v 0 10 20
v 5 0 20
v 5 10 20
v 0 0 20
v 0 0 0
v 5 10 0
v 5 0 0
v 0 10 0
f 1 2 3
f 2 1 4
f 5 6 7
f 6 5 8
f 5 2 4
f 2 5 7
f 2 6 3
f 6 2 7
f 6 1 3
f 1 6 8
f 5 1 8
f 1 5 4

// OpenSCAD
cube([5, 10, 20]);

//sphere(5);

/*
cylinder(h=5, r1=10, r2=10);
cube([50, 50, 50]);
*/
